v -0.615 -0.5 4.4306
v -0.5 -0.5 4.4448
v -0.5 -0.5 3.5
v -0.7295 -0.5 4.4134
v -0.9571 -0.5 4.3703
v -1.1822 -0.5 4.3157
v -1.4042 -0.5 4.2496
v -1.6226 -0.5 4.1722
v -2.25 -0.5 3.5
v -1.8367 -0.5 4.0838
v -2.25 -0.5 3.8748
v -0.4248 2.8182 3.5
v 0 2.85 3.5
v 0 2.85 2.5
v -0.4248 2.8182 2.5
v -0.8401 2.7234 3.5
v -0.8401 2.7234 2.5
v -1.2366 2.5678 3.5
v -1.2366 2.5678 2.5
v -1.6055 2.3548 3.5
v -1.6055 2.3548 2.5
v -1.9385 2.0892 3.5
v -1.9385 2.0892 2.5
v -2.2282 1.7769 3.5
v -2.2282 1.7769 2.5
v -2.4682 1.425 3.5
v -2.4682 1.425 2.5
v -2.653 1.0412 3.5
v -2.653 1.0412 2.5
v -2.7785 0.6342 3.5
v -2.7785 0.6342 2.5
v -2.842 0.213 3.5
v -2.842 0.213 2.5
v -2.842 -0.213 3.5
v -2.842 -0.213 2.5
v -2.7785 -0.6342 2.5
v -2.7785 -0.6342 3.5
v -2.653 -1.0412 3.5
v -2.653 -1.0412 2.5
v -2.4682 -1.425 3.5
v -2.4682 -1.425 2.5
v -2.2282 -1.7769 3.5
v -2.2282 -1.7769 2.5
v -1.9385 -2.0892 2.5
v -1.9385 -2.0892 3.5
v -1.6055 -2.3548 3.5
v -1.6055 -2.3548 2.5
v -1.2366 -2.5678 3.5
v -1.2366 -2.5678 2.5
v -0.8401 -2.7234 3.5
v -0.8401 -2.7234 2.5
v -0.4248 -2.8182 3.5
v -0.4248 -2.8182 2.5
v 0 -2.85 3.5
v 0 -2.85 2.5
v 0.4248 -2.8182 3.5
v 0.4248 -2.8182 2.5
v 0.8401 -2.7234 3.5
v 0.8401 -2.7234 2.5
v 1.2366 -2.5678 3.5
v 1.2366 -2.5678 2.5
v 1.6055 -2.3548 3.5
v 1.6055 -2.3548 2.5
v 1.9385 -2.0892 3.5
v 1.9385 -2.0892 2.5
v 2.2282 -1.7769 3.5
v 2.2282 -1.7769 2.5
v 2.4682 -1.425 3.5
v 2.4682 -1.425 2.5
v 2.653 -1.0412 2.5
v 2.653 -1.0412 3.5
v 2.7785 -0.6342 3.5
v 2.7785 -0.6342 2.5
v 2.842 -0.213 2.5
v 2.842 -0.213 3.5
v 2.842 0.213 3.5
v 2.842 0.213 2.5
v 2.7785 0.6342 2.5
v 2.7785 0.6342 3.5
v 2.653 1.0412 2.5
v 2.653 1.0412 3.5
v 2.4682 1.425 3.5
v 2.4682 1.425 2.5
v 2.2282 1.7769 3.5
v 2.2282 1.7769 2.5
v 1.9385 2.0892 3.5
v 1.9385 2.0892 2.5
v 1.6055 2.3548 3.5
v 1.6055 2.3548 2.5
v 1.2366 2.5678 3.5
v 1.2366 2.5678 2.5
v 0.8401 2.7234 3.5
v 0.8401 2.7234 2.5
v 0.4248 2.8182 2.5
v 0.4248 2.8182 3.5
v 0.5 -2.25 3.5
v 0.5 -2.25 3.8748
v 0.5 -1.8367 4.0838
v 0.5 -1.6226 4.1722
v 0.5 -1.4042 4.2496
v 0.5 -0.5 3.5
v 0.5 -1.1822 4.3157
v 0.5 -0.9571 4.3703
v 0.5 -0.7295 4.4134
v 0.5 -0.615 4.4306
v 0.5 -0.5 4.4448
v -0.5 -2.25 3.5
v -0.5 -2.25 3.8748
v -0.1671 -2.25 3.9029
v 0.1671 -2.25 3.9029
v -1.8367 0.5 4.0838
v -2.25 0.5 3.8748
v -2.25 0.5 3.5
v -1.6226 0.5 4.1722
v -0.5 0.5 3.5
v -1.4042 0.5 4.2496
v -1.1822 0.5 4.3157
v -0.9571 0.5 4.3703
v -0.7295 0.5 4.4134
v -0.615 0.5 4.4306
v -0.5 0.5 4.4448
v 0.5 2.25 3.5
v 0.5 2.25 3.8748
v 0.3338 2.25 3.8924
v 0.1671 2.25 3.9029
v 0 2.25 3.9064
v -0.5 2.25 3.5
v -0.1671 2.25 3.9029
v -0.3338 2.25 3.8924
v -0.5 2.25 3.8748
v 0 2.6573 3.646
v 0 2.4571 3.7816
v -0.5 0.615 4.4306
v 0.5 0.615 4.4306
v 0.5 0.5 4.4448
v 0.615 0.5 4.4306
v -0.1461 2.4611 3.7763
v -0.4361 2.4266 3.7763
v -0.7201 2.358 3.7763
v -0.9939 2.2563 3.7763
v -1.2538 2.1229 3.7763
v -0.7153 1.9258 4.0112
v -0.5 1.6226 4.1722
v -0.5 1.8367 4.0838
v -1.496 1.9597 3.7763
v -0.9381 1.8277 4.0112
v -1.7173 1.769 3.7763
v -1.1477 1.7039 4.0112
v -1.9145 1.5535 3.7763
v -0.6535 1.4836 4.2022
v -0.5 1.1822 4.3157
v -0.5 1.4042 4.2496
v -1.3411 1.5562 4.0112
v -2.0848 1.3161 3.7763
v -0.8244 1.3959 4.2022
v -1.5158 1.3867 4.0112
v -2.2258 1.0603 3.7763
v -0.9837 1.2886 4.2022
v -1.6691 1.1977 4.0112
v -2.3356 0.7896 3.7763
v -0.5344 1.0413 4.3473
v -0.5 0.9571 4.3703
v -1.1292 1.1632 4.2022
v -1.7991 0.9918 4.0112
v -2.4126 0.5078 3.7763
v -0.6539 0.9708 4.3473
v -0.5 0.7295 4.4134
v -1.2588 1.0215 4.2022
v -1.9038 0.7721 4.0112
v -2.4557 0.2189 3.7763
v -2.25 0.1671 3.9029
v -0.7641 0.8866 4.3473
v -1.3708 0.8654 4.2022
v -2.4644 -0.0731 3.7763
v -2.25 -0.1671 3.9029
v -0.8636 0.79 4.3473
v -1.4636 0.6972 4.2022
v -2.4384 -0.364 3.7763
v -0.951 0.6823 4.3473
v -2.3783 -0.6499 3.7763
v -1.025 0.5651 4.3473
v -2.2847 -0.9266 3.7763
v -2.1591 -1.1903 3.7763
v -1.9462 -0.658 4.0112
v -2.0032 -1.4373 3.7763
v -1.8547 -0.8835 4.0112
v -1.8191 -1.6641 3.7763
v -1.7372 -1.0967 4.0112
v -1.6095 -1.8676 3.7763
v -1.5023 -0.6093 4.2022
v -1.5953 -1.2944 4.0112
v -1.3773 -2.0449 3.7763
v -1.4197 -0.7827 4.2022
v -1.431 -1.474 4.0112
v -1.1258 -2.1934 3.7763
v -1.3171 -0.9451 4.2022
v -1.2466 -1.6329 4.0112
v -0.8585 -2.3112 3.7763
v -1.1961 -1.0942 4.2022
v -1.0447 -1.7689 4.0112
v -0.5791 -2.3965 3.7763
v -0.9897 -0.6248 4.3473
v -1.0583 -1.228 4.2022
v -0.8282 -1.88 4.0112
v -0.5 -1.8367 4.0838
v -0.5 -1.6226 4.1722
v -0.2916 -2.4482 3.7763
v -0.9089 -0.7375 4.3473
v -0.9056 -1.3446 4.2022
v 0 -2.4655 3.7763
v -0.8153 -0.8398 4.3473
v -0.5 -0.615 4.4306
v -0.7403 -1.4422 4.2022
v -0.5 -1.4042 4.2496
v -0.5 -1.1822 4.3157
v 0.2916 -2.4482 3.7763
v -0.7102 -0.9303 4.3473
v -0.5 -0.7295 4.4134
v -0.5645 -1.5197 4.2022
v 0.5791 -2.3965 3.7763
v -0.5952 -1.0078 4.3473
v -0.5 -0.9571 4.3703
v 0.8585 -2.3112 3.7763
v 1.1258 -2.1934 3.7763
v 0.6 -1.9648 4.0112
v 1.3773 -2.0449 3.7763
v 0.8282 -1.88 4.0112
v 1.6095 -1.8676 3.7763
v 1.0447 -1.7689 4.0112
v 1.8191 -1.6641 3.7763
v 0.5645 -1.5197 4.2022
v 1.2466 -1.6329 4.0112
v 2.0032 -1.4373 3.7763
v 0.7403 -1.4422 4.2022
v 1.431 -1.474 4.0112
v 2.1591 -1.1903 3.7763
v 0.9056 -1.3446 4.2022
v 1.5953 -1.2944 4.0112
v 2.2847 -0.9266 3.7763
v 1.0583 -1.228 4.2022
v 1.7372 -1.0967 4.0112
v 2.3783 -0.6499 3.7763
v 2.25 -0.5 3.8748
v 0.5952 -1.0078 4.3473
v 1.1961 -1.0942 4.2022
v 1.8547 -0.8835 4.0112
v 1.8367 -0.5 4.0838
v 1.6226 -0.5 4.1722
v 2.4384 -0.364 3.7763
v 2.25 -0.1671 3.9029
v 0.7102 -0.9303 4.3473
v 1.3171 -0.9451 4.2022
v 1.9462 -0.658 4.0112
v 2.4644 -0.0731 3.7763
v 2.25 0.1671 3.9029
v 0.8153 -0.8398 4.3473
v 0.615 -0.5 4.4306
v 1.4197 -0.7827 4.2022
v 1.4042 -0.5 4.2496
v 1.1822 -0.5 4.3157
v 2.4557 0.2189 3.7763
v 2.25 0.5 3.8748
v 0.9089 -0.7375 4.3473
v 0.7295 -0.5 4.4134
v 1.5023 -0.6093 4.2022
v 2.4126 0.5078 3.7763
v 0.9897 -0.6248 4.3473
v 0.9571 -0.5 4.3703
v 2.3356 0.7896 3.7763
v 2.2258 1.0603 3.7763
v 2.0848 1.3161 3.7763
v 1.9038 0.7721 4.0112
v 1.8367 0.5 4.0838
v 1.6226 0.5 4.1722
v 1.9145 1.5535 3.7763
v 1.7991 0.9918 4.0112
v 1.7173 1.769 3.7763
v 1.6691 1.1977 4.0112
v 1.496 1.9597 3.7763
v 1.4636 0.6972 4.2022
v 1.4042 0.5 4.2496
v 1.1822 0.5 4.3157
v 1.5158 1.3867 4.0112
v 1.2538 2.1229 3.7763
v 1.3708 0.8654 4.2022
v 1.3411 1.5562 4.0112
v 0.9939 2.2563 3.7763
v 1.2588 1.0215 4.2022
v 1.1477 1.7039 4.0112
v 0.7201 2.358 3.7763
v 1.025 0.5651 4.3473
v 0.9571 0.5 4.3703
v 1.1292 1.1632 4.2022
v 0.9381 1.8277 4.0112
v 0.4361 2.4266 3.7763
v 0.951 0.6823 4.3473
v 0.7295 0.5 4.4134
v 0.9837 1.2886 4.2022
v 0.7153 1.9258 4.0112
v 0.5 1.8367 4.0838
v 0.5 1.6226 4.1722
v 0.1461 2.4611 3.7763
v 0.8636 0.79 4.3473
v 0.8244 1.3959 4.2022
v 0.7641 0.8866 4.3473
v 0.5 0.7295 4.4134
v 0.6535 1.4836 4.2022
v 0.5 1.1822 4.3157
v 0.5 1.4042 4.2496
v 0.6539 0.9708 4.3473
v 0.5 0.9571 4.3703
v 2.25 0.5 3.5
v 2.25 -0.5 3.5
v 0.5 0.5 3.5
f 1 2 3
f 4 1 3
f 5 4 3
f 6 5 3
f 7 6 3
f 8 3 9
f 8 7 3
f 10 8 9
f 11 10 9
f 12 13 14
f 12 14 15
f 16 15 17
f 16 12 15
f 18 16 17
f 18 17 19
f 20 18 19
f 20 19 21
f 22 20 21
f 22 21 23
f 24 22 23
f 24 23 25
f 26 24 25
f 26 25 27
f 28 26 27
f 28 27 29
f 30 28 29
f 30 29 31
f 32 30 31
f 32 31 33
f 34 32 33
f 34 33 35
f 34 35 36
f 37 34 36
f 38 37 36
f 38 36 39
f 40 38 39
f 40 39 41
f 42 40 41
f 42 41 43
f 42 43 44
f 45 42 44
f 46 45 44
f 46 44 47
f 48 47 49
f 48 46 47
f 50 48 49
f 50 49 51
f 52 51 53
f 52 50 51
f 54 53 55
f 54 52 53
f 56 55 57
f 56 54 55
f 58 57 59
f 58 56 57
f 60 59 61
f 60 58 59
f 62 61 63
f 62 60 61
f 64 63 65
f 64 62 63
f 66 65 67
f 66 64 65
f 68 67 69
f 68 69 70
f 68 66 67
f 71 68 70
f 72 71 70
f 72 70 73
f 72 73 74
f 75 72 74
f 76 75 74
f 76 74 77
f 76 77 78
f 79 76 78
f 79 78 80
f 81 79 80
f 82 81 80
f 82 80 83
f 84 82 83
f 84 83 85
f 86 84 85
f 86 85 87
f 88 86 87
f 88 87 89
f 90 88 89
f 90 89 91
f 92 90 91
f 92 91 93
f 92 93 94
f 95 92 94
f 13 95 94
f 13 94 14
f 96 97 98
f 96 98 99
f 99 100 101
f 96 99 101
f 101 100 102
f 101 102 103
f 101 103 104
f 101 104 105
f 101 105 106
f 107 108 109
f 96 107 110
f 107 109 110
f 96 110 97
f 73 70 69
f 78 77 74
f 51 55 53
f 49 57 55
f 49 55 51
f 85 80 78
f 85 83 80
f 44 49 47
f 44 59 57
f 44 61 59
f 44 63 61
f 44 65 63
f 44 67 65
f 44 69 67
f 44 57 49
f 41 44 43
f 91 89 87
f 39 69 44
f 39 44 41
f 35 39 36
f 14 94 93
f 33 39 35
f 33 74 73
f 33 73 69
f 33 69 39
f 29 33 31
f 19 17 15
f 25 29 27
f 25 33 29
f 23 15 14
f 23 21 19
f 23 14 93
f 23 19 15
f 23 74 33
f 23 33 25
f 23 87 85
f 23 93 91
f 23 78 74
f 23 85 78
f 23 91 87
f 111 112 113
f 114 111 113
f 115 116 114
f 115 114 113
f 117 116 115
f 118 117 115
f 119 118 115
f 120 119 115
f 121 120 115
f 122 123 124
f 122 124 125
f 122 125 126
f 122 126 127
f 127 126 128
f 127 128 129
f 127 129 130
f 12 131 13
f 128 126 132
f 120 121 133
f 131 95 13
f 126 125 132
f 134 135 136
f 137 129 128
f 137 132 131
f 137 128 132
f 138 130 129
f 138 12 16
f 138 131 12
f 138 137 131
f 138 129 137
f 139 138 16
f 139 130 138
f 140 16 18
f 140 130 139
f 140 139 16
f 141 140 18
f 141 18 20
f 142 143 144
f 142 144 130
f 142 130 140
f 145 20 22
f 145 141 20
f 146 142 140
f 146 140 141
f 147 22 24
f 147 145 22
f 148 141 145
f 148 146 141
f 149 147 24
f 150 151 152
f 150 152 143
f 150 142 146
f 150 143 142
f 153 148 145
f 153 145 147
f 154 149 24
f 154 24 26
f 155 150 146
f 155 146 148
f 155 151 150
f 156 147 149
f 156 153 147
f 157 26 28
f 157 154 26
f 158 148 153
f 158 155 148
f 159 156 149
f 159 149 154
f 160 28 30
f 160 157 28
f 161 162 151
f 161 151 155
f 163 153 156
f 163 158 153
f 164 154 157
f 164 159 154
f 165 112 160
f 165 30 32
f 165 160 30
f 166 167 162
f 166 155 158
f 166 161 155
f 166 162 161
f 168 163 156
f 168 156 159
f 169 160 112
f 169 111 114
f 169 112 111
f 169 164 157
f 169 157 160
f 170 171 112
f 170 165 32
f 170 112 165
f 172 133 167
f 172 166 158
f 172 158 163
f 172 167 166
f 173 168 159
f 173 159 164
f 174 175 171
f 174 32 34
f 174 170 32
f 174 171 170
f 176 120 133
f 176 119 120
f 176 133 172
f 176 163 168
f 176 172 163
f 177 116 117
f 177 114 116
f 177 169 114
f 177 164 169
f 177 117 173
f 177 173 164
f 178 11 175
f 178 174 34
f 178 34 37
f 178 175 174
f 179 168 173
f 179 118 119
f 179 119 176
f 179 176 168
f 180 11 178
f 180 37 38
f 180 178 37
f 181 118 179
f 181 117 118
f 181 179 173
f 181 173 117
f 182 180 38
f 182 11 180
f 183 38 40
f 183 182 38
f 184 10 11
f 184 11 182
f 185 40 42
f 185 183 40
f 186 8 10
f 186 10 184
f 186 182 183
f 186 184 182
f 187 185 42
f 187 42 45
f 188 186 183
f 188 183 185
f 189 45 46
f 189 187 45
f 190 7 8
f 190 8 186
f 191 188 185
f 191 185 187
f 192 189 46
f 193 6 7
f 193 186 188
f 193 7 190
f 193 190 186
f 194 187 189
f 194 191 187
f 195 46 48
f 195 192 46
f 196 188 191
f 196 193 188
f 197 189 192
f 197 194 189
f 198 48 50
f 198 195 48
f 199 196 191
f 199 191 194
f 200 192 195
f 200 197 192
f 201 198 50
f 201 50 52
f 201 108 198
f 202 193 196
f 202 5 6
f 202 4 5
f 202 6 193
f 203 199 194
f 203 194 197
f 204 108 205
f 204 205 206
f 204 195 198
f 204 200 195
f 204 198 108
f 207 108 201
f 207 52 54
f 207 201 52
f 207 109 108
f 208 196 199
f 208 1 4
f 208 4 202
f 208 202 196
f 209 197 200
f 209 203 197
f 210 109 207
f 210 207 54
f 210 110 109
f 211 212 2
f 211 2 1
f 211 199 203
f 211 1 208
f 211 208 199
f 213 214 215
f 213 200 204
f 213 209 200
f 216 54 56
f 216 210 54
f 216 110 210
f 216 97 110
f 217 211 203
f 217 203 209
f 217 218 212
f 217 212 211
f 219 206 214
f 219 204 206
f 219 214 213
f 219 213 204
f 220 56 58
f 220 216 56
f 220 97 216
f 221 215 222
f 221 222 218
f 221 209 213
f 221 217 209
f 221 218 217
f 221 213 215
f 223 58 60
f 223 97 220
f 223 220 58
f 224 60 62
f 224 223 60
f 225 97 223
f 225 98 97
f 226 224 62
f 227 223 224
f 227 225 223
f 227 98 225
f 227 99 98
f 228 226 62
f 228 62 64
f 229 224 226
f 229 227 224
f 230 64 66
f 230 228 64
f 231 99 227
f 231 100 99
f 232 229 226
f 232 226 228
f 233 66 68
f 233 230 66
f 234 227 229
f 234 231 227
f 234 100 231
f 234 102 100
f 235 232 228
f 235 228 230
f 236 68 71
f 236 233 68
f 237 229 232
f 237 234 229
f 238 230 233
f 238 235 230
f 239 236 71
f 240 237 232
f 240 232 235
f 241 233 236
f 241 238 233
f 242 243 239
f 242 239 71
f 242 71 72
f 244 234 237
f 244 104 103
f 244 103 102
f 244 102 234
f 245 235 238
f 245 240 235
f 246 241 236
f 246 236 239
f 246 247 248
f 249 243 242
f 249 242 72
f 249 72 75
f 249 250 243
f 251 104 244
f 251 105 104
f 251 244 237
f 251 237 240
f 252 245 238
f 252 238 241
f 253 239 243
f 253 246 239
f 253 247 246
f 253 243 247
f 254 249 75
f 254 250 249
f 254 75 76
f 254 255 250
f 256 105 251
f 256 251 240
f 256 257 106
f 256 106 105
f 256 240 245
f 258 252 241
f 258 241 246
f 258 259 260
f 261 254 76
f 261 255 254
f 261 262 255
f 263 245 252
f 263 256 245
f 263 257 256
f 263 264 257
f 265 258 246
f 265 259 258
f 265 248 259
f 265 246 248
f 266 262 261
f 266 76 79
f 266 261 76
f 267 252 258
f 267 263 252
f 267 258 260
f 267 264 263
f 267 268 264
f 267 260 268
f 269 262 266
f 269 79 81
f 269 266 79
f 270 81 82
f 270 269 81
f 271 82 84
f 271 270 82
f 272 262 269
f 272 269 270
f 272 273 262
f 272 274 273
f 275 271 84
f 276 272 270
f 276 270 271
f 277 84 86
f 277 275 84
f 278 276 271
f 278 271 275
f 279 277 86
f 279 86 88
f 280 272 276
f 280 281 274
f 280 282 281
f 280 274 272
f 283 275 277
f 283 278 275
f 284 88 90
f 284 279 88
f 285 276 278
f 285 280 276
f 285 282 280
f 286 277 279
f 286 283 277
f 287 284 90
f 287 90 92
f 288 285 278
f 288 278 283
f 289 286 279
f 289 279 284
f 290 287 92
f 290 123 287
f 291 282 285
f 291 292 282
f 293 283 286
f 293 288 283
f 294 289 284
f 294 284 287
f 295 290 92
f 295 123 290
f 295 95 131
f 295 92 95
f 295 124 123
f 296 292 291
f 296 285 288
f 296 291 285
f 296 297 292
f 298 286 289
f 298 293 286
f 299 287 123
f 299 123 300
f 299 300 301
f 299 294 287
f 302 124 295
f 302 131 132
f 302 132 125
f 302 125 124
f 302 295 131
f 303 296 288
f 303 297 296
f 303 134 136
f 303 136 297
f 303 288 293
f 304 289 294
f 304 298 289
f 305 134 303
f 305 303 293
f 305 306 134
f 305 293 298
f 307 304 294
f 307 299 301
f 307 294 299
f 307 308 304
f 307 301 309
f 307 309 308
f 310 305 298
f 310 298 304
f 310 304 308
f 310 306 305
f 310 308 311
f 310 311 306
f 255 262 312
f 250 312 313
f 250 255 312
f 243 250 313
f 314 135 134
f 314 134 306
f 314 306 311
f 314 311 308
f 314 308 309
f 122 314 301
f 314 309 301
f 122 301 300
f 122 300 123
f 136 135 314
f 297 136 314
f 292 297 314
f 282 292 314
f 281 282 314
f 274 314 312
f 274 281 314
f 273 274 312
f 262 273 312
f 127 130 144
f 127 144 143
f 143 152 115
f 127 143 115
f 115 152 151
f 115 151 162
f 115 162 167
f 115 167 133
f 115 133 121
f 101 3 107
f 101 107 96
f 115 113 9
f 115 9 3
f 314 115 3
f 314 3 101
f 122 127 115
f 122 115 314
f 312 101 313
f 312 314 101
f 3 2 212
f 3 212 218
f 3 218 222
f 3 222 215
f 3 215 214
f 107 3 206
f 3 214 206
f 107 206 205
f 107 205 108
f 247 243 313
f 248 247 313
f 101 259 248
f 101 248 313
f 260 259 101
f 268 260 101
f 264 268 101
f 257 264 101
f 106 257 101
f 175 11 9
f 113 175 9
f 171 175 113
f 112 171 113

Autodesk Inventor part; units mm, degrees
ref_plane "YZ Plane" through (0, 0, 0) normal (1, 0, 0) x (0, 1, 0)
ref_plane "XZ Plane" through (0, 0, 0) normal (0, 1, 0) x (-1, 0, 0)
sketch "スケッチ1" plane through (0, 0, 0) normal (0, 0, 1) x (1, 0, 0)
  circle A0 centre (0, 0) radius 1.6
  circle A1 centre (0, 0) radius 3
  dimension "d0" = 3.2
  dimension "d1" = 6
extrude "押し出し1" add sketch "スケッチ1" along normal blind 2.5
sketch "スケッチ2" plane through (0, 0, 0) normal (1, 0, 0) x (0, 1, 0)
  arc A0 (2.85, 3.5) -> (-2.85, 3.5) centre (0, -0.0613) ccw
  line L0 (2.85, 3.5) -> (-2.85, 3.5)
  line L1 (-2.85, 3.5) -> (-2.85, 2.5)
  line L2 (-2.85, 2.5) -> (2.85, 2.5)
  line L3 (2.85, 2.5) -> (2.85, 3.5)
  line L4 (3, 2.5) -> (-3, 2.5) projected
  line L5 (10, 4.5) -> (-10, 4.5)
  line L6 (0, 2.5) -> (0, 4.5)
  point P0 (0, 0)
  point P1 (0, 4.5)
  dimension "d4" = 1
  dimension "d5" = 1
  dimension "d7" = 5.7
revolve "回転1" add sketch "スケッチ2" angle 360 about axis through (0, 0, 2.5) along (0, 0, 1) picked at (1.6112, 3.682) contours L0 L6 A0 | L3 L2 L6 L0
ref_plane "作業平面1" through (0, 0, 4.5) normal (0, 0, 1) x (1, 0, 0)
sketch "スケッチ3" plane through (0, 0, 4.5) normal (0, 0, 1) x (1, 0, 0)
  line L0 (2.25, -0.5) -> (-2.25, -0.5)
  line L1 (-2.25, -0.5) -> (-2.25, 0.5)
  line L2 (-2.25, 0.5) -> (2.25, 0.5)
  line L3 (2.25, 0.5) -> (2.25, -0.5)
  line L4 (2.25, -0.5) -> (-2.25, 0.5) construction
  line L5 (-2.25, -0.5) -> (2.25, 0.5) construction
  line L6 (-0.5, -2.25) -> (0.5, -2.25)
  line L7 (0.5, -2.25) -> (0.5, 2.25)
  line L8 (0.5, 2.25) -> (-0.5, 2.25)
  line L9 (-0.5, 2.25) -> (-0.5, -2.25)
  line L10 (-0.5, -2.25) -> (0.5, 2.25) construction
  line L11 (0.5, -2.25) -> (-0.5, 2.25) construction
  point P0 (0, 0)
  point P1 (-0.5, 0.5)
  point P2 (-0.5, -0.5)
  point P3 (0.5, -0.5)
  point P4 (0.5, 0.5)
  dimension "d9" = 4.5
  dimension "d10" = 1
extrude "押し出し2" cut sketch "スケッチ3" against normal blind 1
sketch "スケッチ4" plane through (0, 0, 0) normal (0, 0, -1) x (-1, 0, 0)
  circle A0 centre (0, 0) radius 3 projected
extrude "押し出し3" cut sketch "スケッチ4" against normal up to surface (2.5 mm away)
properties part number "screw_M3" material "アルミニウム 6061"
